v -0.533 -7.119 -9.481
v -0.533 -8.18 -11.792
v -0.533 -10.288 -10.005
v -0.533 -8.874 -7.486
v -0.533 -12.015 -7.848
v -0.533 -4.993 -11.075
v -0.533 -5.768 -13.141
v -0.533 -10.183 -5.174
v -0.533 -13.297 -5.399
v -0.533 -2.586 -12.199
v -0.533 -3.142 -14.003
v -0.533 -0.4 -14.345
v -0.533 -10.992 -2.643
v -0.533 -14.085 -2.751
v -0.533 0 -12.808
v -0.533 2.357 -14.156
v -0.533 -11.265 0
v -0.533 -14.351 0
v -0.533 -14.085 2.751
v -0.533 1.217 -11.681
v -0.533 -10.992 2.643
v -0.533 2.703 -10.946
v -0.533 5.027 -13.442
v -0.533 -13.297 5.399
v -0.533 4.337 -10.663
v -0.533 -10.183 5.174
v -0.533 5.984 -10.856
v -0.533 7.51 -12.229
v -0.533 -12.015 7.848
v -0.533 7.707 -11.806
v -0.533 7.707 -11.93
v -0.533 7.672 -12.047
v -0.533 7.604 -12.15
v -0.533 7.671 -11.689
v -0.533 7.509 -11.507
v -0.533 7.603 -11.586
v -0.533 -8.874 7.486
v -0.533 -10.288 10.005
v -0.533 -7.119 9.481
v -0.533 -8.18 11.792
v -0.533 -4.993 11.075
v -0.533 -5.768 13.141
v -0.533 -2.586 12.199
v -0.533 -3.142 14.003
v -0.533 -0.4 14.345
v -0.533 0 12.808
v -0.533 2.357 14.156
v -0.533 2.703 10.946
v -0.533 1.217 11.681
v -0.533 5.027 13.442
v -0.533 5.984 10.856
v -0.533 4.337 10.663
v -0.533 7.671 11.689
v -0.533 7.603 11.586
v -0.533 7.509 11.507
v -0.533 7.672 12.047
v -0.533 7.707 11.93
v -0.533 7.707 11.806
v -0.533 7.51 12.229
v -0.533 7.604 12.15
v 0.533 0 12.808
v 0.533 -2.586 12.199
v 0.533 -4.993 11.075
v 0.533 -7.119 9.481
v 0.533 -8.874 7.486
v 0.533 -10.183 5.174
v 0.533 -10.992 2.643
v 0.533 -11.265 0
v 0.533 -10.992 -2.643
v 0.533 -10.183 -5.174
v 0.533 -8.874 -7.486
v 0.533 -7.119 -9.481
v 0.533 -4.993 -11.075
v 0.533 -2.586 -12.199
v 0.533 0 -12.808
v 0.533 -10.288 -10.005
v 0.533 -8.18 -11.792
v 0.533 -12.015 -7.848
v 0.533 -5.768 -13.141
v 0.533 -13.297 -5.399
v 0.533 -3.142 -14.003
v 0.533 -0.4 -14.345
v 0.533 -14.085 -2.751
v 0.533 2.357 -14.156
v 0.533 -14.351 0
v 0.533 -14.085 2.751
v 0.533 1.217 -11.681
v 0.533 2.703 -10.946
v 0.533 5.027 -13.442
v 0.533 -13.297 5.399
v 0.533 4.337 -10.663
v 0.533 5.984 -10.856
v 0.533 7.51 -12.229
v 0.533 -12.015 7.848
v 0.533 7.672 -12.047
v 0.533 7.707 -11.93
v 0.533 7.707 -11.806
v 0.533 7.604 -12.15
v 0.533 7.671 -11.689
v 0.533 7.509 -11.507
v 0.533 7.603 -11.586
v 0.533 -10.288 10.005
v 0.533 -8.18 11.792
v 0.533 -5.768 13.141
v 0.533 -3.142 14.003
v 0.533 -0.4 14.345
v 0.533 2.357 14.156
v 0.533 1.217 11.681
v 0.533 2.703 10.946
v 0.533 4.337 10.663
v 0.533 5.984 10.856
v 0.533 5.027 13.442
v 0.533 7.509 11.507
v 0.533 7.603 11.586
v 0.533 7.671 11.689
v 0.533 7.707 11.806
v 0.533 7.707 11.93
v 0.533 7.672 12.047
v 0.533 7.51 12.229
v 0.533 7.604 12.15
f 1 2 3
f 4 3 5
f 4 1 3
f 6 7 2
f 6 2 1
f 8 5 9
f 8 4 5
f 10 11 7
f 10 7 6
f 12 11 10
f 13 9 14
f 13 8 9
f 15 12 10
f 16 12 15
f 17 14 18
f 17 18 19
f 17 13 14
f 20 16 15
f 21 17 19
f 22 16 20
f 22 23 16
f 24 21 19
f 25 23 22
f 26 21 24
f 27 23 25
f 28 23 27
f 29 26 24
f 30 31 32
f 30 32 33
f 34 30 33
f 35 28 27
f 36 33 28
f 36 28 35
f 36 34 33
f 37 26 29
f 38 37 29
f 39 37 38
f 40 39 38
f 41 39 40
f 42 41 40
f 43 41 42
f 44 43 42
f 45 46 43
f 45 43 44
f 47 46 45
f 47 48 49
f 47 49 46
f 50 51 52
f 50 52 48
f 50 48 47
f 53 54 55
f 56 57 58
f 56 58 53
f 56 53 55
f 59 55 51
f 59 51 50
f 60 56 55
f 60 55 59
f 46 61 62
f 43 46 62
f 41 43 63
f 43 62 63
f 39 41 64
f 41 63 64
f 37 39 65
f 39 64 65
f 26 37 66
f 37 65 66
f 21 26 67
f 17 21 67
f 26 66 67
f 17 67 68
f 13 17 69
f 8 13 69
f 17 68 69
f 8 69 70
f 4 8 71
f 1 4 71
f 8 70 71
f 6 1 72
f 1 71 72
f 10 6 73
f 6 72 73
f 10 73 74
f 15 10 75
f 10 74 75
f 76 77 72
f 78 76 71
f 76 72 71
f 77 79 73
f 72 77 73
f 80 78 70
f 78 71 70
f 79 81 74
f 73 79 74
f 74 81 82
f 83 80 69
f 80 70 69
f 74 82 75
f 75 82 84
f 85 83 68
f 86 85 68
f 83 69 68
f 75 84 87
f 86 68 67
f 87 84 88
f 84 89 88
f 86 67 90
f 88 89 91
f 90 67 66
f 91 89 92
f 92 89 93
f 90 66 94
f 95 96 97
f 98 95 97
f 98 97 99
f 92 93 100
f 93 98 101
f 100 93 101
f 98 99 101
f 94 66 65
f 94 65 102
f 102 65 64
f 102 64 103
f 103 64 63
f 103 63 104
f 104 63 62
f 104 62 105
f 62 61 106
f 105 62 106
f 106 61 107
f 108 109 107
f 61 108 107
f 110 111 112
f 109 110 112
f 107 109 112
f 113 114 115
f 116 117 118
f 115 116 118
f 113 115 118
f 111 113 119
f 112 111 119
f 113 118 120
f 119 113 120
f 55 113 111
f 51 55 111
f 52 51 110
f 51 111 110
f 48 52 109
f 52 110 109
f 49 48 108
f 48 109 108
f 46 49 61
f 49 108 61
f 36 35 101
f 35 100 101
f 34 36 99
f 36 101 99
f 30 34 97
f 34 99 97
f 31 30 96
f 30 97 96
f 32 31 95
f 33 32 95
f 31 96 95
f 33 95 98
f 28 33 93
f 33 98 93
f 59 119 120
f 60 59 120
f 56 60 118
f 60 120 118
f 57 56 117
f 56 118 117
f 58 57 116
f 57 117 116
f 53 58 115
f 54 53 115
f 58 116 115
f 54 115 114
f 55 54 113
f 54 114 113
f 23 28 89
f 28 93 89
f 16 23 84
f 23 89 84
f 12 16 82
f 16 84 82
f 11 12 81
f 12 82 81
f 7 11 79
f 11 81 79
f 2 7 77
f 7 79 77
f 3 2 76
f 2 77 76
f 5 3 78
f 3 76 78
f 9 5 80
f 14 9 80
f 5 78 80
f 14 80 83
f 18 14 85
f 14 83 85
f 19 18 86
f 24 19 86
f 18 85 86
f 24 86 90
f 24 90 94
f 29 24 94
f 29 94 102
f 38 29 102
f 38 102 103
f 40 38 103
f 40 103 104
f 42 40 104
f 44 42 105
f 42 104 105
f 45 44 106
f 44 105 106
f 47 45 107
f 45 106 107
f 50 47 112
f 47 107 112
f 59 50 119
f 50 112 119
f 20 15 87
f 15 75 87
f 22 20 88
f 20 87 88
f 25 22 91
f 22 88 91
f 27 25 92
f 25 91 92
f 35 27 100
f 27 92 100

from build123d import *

# Parameters (mm, degrees)
EXTRUDE1_DEPTH = 0.5334


with BuildPart() as part:
    # Sketch1 → Extrude1 (new, symmetric)
    with BuildSketch(Plane(origin=(0, 0, 0), x_dir=(0, 0, -1), z_dir=(1, 0, 0))):
        with BuildLine():
            ThreePointArc((-12.80795, 0), (0, -11.2649), (12.80795, 0))
            ThreePointArc((12.80795, 0), (10.74595989, 3.509932598), (11.507411117, 7.508885221))
            ThreePointArc((11.507411117, 7.508885221), (11.867986747, 7.711626094), (12.229149698, 7.509933333))
            ThreePointArc((12.229149698, 7.509933333), (0, -14.351), (-12.229149698, 7.509933333))
            ThreePointArc((-12.229149698, 7.509933333), (-11.867986747, 7.711626094), (-11.507411117, 7.508885221))
            ThreePointArc((-11.507411117, 7.508885221), (-10.74595989, 3.509932598), (-12.80795, 0))
        make_face()
    extrude(amount=EXTRUDE1_DEPTH, both=True)


solid = part.part
